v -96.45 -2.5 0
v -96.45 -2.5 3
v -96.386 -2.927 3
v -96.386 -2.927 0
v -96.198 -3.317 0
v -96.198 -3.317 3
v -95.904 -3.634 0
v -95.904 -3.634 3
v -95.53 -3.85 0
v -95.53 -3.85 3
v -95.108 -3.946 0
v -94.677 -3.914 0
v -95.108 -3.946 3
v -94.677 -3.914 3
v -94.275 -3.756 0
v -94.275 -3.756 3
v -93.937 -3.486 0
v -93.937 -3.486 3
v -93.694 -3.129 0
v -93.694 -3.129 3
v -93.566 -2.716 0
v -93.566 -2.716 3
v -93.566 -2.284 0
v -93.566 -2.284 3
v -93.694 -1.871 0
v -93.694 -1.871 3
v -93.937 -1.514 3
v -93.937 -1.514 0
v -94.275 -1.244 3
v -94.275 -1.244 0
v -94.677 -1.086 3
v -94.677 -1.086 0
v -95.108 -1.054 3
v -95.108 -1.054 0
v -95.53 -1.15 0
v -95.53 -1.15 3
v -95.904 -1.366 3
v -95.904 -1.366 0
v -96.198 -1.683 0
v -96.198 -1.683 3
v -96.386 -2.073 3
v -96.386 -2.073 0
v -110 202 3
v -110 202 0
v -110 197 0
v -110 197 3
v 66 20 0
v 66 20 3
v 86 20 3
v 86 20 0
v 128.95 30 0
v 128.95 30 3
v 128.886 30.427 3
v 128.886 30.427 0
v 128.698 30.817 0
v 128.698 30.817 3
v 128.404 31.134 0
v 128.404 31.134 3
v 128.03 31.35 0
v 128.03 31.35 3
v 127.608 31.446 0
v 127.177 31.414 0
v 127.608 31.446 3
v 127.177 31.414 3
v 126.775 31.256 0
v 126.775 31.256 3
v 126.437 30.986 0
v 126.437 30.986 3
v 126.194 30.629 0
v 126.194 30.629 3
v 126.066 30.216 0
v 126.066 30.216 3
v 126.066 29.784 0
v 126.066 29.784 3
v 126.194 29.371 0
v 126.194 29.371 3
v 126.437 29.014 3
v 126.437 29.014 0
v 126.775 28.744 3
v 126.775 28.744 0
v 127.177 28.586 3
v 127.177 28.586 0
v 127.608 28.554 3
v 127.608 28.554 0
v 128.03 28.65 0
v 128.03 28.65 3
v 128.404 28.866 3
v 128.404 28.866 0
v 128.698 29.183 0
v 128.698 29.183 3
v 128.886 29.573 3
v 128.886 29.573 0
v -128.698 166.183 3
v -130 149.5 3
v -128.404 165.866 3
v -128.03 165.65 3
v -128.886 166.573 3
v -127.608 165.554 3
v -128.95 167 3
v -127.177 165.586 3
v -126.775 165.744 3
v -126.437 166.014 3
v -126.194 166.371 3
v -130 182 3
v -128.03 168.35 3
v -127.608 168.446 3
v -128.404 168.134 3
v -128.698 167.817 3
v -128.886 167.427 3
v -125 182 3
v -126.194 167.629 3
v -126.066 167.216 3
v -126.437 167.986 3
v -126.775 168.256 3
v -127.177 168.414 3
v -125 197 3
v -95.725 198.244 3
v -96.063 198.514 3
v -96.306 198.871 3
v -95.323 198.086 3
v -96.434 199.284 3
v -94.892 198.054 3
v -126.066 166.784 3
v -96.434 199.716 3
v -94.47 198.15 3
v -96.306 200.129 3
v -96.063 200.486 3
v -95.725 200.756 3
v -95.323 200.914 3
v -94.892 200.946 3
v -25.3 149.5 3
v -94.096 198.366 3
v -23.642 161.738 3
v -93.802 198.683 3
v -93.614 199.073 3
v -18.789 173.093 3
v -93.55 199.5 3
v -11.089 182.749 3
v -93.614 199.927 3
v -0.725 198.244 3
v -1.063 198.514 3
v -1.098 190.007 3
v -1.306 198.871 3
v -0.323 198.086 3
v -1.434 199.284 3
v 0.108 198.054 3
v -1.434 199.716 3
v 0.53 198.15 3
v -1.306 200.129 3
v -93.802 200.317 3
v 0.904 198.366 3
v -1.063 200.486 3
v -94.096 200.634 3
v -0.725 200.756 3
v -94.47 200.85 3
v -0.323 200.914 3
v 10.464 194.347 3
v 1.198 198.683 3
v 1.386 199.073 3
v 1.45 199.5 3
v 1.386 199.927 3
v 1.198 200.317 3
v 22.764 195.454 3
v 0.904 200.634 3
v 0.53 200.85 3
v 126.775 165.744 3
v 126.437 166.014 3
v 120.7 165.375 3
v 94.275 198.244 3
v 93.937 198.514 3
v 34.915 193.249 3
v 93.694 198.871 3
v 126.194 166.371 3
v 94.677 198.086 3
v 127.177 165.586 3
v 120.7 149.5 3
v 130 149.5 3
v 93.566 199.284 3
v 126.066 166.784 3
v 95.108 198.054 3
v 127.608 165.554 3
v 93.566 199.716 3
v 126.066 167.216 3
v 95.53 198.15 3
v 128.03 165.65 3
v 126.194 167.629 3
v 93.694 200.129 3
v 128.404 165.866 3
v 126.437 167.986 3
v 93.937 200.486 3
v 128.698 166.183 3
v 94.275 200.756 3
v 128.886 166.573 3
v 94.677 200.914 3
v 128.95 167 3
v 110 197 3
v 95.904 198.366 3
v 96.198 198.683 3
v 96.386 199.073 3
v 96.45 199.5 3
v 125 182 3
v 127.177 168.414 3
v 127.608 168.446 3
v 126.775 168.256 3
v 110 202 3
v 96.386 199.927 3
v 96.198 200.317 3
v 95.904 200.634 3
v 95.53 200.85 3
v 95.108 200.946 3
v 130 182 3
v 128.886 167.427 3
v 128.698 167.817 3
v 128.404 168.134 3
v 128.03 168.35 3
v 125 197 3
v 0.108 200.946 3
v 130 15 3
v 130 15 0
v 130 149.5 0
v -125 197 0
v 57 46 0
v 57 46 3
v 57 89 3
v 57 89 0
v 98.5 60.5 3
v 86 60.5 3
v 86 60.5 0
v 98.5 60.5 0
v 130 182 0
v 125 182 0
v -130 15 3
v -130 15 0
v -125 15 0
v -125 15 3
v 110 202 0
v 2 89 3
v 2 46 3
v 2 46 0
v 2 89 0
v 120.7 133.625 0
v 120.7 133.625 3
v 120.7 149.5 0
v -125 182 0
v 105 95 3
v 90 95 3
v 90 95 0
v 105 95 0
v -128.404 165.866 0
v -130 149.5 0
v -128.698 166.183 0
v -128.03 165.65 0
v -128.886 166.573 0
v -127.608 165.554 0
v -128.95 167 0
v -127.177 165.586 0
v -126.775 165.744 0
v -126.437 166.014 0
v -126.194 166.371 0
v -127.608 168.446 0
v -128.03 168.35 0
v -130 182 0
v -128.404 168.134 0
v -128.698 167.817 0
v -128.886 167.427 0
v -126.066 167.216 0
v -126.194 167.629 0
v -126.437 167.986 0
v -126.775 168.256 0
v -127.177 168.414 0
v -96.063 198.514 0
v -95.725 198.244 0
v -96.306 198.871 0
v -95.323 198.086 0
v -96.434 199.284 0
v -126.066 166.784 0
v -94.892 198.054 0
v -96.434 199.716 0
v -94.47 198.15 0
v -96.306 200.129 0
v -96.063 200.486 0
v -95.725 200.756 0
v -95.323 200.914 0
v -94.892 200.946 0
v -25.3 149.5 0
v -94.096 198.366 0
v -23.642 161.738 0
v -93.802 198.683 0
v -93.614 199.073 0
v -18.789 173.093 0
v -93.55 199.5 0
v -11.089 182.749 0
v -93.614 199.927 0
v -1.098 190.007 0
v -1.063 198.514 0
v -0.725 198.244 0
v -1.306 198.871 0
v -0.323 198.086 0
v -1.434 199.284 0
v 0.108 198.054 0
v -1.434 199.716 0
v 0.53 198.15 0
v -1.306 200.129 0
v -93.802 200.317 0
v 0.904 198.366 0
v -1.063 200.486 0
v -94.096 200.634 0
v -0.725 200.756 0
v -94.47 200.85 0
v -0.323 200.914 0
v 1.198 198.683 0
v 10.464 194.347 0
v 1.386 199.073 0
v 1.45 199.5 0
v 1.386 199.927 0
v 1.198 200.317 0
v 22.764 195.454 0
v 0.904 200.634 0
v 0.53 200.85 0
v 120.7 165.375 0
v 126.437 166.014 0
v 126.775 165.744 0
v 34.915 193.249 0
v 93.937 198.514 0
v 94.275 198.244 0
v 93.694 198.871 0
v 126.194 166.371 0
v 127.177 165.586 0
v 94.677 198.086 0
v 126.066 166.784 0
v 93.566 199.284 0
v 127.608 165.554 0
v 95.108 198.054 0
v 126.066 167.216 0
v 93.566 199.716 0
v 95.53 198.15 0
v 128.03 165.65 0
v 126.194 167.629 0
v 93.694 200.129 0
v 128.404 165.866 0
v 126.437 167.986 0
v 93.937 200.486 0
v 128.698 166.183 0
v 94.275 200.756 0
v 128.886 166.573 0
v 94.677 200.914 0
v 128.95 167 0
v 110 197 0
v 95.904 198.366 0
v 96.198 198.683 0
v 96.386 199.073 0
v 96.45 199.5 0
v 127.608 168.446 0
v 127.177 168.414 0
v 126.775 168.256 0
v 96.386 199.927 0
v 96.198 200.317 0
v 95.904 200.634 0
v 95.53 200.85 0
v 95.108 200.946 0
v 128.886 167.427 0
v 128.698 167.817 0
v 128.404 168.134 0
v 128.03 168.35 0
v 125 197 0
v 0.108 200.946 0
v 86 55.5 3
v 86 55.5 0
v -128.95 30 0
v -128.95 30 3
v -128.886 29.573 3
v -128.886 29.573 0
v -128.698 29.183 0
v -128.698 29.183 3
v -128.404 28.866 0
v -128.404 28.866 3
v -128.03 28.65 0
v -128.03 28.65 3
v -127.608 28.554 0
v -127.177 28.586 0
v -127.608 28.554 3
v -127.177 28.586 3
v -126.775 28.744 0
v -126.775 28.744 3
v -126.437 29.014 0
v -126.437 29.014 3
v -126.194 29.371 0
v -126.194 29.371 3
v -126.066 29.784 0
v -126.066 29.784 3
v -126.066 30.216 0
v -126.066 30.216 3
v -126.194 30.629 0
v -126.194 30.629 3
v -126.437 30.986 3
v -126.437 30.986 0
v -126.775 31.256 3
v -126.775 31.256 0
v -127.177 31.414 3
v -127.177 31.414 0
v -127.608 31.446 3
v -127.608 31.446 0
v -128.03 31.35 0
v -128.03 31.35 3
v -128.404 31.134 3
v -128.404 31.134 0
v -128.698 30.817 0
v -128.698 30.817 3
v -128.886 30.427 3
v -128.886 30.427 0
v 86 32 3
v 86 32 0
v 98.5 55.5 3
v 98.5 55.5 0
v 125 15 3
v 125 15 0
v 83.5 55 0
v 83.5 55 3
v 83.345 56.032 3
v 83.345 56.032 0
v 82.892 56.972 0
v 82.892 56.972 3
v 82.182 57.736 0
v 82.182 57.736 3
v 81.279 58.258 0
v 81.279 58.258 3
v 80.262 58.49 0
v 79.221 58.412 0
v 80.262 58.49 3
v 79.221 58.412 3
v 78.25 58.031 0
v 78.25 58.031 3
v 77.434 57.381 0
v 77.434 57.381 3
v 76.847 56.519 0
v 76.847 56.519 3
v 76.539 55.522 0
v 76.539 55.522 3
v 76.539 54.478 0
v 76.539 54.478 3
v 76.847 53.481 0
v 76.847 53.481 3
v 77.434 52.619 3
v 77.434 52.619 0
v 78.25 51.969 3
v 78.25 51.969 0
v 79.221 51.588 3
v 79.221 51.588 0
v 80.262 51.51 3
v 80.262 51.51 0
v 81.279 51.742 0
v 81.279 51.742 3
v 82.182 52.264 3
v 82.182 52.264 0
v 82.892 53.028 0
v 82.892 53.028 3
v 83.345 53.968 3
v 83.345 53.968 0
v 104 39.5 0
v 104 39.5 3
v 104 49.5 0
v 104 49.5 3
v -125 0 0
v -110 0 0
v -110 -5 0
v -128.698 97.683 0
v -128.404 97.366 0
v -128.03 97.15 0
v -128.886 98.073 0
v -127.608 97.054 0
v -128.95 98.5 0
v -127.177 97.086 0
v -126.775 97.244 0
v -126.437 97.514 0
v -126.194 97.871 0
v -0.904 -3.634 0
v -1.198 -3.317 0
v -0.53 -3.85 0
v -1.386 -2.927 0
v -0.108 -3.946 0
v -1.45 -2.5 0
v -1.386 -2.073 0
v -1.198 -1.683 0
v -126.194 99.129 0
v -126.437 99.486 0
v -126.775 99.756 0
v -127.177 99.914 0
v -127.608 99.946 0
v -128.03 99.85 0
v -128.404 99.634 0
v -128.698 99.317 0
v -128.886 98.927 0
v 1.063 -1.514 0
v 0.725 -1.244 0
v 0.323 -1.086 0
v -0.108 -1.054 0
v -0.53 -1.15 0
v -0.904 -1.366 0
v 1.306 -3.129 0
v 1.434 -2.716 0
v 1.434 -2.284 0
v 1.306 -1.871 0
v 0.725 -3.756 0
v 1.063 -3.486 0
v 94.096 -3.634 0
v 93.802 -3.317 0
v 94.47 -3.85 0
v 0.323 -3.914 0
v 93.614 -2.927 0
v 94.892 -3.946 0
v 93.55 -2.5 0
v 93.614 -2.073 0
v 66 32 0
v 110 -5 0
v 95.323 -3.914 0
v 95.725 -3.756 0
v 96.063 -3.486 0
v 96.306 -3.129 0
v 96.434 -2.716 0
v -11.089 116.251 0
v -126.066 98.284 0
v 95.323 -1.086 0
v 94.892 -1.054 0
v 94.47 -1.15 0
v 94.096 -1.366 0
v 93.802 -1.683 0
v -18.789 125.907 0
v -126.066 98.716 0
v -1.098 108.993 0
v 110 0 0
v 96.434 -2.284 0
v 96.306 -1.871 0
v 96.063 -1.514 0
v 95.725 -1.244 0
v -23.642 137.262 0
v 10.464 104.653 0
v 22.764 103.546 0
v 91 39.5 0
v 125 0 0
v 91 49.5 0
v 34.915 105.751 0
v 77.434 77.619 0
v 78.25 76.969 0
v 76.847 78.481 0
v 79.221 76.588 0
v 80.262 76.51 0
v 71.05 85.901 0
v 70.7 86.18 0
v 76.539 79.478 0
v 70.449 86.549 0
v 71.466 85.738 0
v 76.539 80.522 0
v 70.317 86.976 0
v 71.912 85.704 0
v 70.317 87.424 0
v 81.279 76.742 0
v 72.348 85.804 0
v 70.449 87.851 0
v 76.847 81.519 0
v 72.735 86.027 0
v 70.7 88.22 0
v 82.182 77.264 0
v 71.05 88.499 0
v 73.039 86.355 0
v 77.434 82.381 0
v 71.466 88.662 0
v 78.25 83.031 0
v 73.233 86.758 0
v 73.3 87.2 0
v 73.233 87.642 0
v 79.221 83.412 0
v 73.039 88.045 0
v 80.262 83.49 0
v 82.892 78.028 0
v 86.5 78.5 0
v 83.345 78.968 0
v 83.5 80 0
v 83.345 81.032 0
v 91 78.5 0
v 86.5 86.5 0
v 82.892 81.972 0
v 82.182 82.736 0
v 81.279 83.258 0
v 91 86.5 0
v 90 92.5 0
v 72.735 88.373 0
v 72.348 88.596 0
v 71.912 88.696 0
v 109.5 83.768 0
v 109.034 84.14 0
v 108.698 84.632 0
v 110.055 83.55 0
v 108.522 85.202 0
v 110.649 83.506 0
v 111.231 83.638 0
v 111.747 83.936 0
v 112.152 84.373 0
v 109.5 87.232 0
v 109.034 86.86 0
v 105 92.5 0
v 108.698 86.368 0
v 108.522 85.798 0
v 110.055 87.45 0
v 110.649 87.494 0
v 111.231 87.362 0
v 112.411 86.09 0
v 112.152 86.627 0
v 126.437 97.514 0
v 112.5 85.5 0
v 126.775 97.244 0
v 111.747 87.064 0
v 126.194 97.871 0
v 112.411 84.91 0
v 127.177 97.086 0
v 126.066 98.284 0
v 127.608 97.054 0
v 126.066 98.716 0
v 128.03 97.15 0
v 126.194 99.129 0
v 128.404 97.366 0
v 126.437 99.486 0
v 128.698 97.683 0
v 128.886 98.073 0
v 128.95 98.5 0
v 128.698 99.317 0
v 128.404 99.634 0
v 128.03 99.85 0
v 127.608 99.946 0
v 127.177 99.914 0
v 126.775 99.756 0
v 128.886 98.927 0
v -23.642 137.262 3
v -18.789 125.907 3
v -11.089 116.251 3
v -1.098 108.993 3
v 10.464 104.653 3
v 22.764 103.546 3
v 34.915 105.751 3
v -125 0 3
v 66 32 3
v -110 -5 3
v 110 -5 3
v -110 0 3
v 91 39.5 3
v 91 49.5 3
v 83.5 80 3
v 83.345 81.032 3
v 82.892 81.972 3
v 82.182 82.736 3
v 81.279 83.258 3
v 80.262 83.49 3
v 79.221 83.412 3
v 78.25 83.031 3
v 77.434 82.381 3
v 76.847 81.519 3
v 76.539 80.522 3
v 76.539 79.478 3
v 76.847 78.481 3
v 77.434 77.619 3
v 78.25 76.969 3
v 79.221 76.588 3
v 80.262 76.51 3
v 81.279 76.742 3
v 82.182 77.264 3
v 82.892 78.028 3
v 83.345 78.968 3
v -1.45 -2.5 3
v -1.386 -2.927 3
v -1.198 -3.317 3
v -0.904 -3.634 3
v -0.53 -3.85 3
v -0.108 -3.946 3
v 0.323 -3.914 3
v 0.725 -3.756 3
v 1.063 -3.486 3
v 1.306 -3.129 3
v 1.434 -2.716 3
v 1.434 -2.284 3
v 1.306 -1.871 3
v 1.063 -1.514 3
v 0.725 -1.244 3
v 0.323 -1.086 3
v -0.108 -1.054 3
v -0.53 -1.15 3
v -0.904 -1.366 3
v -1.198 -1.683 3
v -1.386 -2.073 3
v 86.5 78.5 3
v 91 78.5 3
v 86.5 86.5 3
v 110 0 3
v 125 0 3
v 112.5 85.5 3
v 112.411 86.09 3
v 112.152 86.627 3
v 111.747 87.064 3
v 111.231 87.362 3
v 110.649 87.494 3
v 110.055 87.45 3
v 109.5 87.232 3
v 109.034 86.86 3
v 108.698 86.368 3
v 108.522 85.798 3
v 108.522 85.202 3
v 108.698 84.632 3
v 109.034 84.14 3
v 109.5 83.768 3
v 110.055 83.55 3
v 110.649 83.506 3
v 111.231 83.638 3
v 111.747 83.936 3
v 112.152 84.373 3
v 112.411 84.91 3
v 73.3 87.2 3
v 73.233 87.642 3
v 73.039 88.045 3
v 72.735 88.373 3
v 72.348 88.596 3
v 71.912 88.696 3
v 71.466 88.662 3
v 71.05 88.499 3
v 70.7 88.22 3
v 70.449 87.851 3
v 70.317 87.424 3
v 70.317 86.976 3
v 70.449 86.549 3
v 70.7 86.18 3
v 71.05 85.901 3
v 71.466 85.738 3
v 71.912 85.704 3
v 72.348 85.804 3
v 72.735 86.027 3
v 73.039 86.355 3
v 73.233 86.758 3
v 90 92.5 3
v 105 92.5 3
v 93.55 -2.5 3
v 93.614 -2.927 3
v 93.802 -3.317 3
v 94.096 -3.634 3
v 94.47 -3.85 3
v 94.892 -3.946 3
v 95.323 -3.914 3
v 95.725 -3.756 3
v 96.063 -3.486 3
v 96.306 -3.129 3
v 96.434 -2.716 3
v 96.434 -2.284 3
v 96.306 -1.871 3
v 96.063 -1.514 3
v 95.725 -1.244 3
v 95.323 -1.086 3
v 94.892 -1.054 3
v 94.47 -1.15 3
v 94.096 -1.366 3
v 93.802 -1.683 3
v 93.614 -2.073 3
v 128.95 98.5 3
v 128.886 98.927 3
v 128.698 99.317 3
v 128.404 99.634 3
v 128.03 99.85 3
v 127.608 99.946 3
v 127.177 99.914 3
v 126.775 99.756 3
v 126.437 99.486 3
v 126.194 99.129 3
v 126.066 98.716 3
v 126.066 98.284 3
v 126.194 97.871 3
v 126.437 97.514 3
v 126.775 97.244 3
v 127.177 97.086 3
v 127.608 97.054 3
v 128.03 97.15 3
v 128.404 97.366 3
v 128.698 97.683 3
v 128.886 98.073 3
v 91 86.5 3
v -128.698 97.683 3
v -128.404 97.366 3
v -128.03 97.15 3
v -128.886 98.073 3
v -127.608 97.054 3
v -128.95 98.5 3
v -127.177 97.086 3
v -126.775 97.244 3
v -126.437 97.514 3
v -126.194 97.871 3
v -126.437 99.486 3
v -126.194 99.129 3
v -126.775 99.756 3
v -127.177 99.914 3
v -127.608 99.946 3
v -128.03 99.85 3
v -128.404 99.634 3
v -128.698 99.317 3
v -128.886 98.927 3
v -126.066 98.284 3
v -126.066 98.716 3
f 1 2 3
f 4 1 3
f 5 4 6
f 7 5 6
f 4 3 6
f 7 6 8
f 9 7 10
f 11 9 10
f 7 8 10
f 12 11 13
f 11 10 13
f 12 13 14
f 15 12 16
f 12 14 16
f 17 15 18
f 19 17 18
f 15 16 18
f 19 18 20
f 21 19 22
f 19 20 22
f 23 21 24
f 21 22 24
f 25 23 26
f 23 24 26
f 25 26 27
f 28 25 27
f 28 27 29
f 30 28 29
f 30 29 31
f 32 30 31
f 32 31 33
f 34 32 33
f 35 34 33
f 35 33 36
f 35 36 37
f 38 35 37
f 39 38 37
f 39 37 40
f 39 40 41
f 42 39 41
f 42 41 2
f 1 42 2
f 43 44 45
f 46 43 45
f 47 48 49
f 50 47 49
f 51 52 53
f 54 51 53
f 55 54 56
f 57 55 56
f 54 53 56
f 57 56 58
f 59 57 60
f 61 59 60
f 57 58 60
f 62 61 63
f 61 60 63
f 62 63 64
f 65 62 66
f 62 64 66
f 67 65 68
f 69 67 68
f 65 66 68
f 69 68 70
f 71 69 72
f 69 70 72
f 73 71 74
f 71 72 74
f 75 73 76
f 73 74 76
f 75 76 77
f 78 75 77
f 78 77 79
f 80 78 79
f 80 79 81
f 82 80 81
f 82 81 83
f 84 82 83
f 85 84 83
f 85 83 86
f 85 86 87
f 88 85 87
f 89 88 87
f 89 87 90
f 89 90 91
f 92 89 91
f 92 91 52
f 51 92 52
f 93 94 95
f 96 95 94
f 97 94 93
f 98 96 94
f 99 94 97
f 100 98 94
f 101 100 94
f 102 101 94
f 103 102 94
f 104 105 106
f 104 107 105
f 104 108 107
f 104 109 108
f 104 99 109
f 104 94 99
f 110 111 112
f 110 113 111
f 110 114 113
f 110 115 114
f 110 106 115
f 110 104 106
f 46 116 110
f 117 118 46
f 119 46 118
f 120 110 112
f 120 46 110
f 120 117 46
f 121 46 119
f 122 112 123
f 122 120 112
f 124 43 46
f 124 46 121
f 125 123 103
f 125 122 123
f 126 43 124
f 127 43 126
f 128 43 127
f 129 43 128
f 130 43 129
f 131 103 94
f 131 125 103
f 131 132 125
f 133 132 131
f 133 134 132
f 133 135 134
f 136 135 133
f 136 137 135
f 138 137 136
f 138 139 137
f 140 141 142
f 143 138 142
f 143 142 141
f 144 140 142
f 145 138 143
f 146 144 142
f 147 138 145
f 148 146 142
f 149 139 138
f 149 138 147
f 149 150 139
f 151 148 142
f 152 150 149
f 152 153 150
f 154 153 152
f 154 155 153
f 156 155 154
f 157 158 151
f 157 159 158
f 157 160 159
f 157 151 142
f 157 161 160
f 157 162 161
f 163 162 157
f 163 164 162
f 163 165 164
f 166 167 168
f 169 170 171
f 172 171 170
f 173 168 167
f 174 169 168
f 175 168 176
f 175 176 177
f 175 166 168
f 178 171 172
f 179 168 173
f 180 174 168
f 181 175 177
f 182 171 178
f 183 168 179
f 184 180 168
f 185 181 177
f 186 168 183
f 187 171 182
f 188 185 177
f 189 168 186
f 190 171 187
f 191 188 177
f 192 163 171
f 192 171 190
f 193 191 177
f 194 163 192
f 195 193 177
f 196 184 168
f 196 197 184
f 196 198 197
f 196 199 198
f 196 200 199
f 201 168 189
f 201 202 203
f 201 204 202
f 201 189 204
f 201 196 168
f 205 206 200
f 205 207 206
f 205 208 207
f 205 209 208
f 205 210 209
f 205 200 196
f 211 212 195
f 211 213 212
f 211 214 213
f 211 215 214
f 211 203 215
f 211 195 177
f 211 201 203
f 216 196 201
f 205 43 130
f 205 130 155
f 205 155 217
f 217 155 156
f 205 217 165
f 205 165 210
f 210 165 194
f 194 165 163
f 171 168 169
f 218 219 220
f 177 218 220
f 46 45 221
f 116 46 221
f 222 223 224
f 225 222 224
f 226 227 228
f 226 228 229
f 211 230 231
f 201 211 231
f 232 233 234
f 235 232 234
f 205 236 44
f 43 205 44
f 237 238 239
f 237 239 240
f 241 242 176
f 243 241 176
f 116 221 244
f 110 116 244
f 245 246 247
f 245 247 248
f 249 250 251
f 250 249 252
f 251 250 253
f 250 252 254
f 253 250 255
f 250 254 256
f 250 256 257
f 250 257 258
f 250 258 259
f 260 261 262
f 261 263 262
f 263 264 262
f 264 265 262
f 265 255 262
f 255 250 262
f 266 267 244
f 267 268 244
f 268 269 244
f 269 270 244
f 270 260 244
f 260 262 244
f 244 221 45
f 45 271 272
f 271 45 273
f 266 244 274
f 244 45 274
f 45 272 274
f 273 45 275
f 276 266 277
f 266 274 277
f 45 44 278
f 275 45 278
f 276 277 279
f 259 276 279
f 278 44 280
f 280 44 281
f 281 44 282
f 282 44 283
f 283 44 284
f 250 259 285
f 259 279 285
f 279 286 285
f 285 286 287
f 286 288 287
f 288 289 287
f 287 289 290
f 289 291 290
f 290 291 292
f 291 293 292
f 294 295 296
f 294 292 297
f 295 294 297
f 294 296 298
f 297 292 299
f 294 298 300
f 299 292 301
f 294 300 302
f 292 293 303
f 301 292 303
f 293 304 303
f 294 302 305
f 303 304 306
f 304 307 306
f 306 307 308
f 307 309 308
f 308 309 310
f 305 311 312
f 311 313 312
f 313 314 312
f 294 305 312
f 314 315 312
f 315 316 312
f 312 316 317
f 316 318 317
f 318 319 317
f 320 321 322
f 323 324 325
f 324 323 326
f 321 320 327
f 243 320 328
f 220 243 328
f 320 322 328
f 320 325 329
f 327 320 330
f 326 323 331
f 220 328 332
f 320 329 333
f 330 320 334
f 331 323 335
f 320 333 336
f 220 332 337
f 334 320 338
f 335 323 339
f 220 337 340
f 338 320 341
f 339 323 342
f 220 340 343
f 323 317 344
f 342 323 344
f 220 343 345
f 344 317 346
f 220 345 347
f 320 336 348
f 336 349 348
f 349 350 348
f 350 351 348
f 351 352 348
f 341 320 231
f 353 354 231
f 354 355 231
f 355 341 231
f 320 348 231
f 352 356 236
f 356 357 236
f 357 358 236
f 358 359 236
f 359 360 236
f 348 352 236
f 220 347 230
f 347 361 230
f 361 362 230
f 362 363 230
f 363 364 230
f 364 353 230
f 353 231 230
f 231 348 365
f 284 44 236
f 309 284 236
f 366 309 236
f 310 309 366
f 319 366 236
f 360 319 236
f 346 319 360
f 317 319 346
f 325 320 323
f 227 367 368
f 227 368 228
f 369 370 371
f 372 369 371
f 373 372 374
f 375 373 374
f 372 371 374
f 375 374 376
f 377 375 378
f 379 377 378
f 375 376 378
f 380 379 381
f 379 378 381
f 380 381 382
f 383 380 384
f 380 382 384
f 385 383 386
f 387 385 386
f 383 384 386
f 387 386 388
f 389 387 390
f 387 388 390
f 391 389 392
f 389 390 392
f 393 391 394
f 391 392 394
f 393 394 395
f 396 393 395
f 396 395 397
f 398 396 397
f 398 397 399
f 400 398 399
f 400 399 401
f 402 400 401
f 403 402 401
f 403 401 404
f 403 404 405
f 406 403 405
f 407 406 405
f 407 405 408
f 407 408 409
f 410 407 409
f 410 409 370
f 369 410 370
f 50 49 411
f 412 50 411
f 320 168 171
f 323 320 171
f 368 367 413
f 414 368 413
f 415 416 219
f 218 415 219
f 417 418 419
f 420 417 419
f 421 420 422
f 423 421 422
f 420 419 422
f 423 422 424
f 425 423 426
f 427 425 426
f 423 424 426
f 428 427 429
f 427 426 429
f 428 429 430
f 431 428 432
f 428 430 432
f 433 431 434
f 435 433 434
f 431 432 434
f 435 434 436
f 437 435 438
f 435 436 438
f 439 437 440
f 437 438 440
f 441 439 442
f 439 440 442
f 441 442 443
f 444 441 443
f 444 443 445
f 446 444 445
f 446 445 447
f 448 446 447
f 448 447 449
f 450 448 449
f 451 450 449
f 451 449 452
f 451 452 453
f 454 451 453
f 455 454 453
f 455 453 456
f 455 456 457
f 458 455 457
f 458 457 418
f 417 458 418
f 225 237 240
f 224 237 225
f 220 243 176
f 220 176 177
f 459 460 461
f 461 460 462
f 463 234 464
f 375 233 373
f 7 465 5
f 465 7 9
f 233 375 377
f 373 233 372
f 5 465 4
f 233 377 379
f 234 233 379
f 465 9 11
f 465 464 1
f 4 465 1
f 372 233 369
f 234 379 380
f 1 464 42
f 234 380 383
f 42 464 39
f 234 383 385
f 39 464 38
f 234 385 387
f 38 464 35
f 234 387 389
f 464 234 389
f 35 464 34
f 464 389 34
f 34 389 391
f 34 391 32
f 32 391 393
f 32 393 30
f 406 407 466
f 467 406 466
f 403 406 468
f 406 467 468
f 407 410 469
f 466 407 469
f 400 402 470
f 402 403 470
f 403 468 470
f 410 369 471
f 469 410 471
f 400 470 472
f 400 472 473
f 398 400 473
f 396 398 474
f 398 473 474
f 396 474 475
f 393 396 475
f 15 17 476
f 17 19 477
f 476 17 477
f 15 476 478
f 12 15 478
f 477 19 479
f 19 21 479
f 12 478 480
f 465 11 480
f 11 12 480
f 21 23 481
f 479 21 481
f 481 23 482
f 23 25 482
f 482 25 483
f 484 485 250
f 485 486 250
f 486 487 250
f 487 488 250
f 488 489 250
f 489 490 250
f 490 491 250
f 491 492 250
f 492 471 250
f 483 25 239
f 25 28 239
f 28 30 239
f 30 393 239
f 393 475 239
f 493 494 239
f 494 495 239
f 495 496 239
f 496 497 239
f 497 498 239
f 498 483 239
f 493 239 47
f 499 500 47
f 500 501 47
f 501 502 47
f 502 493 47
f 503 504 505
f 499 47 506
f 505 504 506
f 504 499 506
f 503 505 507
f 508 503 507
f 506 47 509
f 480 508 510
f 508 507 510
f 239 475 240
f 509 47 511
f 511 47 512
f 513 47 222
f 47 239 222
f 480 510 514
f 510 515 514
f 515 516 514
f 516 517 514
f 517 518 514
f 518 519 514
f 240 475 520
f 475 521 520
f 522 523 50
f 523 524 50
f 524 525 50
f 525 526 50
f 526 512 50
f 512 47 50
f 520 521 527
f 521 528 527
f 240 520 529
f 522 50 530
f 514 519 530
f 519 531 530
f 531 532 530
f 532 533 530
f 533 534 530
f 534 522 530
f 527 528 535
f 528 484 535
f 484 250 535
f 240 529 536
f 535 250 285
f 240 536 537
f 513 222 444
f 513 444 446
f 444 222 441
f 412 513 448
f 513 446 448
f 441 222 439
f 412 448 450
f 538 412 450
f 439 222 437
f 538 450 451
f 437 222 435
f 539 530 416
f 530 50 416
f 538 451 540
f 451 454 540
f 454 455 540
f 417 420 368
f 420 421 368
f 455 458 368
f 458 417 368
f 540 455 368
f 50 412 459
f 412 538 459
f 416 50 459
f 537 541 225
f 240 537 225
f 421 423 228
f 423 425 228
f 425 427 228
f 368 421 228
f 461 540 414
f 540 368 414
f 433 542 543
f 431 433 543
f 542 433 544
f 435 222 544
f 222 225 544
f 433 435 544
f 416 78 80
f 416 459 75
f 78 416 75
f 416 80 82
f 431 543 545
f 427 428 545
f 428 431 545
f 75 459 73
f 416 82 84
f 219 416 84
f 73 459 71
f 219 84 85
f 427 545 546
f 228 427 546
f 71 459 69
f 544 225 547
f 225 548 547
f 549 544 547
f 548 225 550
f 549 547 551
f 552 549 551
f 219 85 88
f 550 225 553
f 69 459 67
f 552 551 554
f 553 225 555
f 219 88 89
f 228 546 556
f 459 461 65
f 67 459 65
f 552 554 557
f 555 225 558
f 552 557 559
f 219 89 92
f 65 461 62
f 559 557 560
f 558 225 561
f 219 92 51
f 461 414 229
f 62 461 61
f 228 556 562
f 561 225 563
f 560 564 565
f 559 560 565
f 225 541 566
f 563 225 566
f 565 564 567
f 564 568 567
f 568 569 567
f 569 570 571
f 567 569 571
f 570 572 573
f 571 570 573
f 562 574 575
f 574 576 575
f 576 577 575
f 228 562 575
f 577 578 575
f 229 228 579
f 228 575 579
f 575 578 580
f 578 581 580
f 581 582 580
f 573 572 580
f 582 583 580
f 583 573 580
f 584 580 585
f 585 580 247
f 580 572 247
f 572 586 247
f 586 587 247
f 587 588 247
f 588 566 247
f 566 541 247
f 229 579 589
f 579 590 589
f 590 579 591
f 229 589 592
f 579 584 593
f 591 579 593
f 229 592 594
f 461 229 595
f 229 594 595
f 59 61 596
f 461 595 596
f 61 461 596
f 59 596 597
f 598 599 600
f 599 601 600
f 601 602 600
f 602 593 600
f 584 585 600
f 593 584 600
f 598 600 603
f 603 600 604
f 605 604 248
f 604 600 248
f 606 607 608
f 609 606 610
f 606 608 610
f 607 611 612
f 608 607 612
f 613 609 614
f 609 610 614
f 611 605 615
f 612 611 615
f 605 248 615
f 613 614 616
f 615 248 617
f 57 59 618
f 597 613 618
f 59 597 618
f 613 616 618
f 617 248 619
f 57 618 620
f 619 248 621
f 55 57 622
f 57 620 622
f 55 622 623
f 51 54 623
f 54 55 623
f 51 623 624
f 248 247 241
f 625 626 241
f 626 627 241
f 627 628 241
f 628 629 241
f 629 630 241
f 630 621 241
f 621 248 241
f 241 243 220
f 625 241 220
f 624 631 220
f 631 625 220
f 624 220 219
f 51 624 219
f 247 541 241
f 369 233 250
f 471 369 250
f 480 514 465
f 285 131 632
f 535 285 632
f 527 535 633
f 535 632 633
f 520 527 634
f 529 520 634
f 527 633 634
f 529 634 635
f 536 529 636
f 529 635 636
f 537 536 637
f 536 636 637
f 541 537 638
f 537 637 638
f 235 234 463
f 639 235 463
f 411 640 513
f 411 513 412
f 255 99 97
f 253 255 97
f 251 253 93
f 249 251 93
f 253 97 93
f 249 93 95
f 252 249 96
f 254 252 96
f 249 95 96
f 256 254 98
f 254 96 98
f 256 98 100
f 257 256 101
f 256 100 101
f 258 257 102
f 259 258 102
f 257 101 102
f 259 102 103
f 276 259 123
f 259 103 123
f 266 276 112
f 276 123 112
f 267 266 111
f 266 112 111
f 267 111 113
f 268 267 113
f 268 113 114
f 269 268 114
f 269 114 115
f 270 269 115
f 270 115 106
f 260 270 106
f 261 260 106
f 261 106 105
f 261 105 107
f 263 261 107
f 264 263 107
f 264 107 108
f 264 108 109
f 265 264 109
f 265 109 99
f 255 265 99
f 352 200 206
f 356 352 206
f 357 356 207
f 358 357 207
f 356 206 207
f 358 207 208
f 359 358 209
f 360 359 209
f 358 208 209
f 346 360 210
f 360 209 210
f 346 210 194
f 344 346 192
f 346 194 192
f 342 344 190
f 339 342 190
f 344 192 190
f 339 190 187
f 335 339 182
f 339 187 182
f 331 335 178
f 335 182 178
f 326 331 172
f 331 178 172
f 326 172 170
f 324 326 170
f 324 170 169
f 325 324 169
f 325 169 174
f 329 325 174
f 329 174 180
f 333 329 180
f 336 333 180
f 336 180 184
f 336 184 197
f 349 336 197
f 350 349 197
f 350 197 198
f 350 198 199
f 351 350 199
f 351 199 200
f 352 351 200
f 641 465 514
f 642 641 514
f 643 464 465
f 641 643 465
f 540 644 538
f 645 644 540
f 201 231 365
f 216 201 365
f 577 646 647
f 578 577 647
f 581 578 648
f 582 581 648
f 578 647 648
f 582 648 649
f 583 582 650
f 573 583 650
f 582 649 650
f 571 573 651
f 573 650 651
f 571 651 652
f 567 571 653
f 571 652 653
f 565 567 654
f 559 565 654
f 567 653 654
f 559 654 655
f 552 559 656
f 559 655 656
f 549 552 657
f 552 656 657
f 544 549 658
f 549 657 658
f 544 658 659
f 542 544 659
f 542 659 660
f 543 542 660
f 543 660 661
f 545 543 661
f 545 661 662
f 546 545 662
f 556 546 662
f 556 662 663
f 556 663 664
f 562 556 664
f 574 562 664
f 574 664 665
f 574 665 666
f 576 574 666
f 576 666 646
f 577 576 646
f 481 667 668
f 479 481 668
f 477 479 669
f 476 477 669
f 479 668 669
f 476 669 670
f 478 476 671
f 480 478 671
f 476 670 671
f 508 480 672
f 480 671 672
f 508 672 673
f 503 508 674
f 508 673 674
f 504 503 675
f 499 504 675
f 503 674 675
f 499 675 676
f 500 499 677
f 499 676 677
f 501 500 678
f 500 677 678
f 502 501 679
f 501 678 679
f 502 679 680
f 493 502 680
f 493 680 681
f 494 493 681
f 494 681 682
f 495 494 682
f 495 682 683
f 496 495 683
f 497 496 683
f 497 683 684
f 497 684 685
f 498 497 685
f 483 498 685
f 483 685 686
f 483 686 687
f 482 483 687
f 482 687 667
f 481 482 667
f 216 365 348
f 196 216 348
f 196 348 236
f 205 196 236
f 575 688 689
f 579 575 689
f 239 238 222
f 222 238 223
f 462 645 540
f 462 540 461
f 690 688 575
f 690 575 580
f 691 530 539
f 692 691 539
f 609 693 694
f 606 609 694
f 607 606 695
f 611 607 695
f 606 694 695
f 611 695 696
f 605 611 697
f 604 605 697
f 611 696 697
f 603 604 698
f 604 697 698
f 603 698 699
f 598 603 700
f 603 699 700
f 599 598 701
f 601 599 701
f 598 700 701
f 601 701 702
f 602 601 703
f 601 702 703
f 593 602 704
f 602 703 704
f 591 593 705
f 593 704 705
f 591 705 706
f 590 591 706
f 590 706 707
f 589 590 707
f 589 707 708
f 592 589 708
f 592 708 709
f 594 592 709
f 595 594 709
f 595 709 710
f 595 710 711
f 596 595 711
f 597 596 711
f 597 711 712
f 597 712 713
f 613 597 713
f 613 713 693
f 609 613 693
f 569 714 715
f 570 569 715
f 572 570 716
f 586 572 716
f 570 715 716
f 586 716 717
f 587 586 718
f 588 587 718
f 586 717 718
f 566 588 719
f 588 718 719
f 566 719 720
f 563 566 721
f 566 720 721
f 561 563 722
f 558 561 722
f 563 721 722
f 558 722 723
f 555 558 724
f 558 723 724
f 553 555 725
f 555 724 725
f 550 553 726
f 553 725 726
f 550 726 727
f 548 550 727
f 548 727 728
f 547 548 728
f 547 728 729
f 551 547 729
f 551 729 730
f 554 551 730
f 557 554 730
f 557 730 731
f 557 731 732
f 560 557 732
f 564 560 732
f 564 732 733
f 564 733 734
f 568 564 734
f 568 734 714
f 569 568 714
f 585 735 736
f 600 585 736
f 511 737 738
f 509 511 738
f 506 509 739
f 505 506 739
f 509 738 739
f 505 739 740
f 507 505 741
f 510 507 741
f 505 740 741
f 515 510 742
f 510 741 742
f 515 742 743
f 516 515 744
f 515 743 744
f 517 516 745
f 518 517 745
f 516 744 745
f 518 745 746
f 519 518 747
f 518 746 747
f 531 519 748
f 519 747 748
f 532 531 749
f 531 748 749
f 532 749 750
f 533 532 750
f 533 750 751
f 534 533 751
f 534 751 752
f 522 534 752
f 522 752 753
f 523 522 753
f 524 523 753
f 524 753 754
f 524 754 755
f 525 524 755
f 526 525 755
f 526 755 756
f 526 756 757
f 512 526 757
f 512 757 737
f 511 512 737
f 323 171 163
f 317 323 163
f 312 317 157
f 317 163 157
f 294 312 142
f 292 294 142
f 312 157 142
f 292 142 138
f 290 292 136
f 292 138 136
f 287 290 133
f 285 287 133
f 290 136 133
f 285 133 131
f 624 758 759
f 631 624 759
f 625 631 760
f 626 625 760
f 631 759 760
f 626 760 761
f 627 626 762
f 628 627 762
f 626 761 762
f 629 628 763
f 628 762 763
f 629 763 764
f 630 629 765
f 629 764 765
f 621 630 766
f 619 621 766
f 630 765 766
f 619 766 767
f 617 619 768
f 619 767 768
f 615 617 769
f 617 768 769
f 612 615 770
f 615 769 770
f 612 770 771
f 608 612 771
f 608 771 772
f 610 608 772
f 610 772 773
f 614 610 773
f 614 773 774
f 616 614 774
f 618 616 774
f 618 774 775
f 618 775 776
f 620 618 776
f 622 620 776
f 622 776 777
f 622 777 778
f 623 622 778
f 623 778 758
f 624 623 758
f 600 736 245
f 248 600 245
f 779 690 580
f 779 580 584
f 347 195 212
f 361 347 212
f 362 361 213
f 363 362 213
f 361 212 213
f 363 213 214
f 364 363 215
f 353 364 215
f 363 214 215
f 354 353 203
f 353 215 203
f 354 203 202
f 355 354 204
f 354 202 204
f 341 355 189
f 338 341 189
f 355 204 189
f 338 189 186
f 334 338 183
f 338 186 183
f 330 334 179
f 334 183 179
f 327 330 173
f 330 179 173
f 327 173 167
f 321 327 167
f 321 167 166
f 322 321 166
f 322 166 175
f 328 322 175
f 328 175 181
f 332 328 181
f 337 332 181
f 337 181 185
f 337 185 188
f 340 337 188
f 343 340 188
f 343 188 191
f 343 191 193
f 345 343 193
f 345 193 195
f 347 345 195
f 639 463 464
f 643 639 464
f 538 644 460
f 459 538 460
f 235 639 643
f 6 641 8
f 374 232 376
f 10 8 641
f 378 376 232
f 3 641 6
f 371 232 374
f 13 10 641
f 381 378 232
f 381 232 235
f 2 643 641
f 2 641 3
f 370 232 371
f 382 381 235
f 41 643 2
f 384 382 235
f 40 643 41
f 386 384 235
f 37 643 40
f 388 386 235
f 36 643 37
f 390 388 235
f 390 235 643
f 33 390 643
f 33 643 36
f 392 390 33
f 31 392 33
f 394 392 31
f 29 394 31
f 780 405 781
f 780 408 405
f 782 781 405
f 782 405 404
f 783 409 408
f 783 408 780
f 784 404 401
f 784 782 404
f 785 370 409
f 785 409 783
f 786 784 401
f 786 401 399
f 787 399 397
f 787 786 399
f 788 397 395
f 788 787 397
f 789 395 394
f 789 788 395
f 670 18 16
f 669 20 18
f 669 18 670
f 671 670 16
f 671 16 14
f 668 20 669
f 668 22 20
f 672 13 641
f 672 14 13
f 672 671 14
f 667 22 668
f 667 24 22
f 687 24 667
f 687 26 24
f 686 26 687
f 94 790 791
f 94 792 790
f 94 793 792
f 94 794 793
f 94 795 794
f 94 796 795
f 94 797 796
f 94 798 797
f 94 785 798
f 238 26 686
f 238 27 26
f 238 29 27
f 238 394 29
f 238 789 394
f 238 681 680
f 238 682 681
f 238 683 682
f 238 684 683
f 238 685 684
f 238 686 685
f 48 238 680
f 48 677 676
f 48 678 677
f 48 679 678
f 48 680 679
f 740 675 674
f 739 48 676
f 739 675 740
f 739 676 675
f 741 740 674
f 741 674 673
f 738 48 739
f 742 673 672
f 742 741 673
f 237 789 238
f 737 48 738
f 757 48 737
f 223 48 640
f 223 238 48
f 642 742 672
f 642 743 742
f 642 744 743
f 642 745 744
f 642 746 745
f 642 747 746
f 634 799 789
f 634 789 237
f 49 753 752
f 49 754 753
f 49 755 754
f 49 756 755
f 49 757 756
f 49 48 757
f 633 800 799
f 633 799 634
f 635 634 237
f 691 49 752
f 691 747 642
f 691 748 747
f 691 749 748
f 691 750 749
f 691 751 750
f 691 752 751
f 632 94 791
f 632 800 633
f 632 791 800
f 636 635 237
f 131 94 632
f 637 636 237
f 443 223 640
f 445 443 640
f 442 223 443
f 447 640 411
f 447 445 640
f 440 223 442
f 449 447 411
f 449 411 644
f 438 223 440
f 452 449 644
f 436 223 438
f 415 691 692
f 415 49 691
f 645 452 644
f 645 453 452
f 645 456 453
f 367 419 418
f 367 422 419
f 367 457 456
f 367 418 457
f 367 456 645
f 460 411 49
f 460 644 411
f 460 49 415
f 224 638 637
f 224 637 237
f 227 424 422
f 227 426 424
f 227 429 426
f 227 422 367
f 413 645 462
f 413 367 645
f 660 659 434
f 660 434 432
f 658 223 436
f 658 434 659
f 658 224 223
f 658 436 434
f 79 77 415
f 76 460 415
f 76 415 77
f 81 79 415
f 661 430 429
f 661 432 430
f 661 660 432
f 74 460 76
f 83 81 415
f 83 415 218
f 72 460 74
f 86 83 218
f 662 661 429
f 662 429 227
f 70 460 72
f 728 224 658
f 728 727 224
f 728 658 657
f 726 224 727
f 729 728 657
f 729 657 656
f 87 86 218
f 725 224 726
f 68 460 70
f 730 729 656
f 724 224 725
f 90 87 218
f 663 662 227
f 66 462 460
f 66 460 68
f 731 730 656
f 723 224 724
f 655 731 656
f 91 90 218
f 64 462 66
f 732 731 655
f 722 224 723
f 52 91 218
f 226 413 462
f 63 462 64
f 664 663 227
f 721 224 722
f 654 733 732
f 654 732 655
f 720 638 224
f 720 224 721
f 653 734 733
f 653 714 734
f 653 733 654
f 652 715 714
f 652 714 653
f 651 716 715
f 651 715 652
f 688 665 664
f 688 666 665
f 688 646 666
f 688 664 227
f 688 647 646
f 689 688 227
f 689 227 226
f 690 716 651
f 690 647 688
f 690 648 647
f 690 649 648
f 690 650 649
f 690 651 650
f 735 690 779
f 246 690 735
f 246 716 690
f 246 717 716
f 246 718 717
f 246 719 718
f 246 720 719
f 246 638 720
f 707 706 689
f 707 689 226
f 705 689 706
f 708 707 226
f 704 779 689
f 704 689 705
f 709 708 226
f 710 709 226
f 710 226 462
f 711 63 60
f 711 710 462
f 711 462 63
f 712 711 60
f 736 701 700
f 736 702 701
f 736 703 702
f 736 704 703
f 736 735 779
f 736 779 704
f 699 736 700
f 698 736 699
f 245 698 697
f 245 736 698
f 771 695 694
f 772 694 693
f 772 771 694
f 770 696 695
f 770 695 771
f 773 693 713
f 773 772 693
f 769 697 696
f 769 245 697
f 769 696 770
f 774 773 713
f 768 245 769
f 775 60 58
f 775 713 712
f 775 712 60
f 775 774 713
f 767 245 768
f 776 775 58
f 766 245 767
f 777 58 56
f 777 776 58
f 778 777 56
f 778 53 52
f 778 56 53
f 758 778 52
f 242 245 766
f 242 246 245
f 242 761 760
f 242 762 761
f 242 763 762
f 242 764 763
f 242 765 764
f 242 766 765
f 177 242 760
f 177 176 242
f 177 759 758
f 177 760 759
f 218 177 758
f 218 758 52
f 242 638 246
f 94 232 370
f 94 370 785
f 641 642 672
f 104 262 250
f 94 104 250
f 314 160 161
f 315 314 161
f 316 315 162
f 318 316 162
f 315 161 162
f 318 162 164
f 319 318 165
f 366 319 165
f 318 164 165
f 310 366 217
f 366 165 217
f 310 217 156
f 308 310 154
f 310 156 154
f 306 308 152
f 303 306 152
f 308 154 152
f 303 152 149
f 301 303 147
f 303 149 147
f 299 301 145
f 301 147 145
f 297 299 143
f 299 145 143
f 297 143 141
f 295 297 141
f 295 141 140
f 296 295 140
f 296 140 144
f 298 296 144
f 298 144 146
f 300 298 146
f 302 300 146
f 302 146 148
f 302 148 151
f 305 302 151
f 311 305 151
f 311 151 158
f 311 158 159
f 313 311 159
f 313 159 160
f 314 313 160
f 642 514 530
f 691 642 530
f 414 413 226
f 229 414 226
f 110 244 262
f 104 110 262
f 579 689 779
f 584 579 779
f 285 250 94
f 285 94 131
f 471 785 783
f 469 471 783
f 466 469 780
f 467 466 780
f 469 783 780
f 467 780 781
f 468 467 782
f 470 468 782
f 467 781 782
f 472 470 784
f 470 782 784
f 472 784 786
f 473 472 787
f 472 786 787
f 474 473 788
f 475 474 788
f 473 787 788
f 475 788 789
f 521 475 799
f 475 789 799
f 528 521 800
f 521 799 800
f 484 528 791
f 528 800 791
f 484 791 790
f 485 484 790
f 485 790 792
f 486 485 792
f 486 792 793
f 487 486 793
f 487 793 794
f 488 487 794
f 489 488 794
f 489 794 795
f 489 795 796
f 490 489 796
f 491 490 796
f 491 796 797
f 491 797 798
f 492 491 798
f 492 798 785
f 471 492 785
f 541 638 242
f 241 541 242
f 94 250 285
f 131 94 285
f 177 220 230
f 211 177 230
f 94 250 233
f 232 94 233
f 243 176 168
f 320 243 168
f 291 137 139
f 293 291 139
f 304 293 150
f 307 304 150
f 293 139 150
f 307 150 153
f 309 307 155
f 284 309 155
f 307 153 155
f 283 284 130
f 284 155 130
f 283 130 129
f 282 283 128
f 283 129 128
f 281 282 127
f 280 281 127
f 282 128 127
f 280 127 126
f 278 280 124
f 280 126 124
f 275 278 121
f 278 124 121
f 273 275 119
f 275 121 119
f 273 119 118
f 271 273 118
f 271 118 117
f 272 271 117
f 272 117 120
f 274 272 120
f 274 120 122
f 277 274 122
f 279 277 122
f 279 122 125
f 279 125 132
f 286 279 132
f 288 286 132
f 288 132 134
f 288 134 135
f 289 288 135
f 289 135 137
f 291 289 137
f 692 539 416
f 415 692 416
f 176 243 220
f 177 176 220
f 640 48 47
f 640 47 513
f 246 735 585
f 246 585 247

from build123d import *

# Parameters (mm, degrees)
BOSS_EXTRUDE1_DEPTH    = 3
CUT_EXTRUDE1_DEPTH     = 241.235301319
SKETCH3_W              = 55
SKETCH3_H              = 43
CUT_EXTRUDE2_DEPTH     = 241.235301319
SPLIT1_SURFACE_1_BACK  = 333.352
SPLIT1_SURFACE_1_DEPTH = 666.704
SPLIT1_SURFACE_2_BACK  = 333.352
SPLIT1_SURFACE_2_DEPTH = 666.704
SKETCH5_W              = 20
SKETCH5_H              = 12
CUT_EXTRUDE3_DEPTH     = 241.235301319
SKETCH6_R              = 3.5
CUT_EXTRUDE4_DEPTH     = 241.235301319
SKETCH7_R              = 1.45
CUT_EXTRUDE5_DEPTH     = 241.235301319
SKETCH8_R              = 2
SKETCH8_R_2            = 1.5
SKETCH8_W              = 12.5
SKETCH8_H              = 5
SKETCH8_W_2            = 4.5
SKETCH8_H_2            = 8
SKETCH8_W_3            = 15
SKETCH8_H_3            = 2.5
SKETCH8_W_4            = 13
SKETCH8_H_4            = 10
CUT_EXTRUDE6_DEPTH     = 241.235301319


with BuildPart() as part:
    # Sketch1 → Boss-Extrude1 (new body)
    with BuildSketch(Plane.XY):
        Polygon((110, 202), (-110, 202), (-110, 197), (-125, 197), (-125, 182), (-130, 182), (-130, 15), (-125, 15), (-125, 0), (-110, 0), (-110, -5), (110, -5), (110, 0), (125, 0), (125, 15), (130, 15), (130, 182), (125, 182), (125, 197), (110, 197), align=None)
    extrude(amount=BOSS_EXTRUDE1_DEPTH)

    # Sketch2 → Cut-Extrude1 (cut, through all)
    with BuildSketch(Plane.XY.offset(3)):
        with BuildLine():
            Line((34.914781741, 105.75140025), (120.7, 133.624707308))
            Line((120.7, 133.624707308), (120.7, 165.375292692))
            Line((120.7, 165.375292692), (34.914781741, 193.24859975))
            ThreePointArc((34.914781741, 193.24859975), (-25.3, 149.5), (34.914781741, 105.75140025))
        make_face()
    extrude(amount=-CUT_EXTRUDE1_DEPTH, mode=Mode.SUBTRACT)

    # Sketch3 → Cut-Extrude2 (cut, through all)
    with BuildSketch(Plane.XY.offset(3)):
        with Locations((29.5, 67.5)):
            Rectangle(SKETCH3_W, SKETCH3_H)
    extrude(amount=-CUT_EXTRUDE2_DEPTH, mode=Mode.SUBTRACT)


with BuildPart() as body_2:
    # Split1: the piece behind the surface
    add(part.part)
    # Split1 surface: a surface, the sketch's curves swept straight by 666.704 mm
    with BuildLine(Plane.XY.offset(3).offset(-SPLIT1_SURFACE_1_BACK), mode=Mode.PRIVATE) as split1_surface_1_path:
        Line((-130, 149.5), (130, 149.5))
    split1_surface_1 = Shell.extrude(split1_surface_1_path.wire(), (0 * SPLIT1_SURFACE_1_DEPTH, 0 * SPLIT1_SURFACE_1_DEPTH, 1 * SPLIT1_SURFACE_1_DEPTH))
    split(bisect_by=split1_surface_1, keep=Keep.BOTTOM)

    # Sketch5 → Cut-Extrude3 (cut, through all)
    with BuildSketch(Plane.XY.offset(3)):
        with Locations((76, 26)):
            Rectangle(SKETCH5_W, SKETCH5_H)
    extrude(amount=-CUT_EXTRUDE3_DEPTH, mode=Mode.SUBTRACT)

    # Sketch6 → Cut-Extrude4 (cut, through all)
    with BuildSketch(Plane.XY.offset(3)):
        with Locations((80, 55)):
            Circle(SKETCH6_R)
        with Locations((80, 80)):
            Circle(SKETCH6_R)
    extrude(amount=-CUT_EXTRUDE4_DEPTH, mode=Mode.SUBTRACT)


with BuildPart() as part_1:
    add(part.part)

    # Split1: split by a surface, the side it looks to stays
    # Split1 surface: a surface, the sketch's curves swept straight by 666.704 mm
    with BuildLine(Plane.XY.offset(3).offset(-SPLIT1_SURFACE_2_BACK), mode=Mode.PRIVATE) as split1_surface_2_path:
        Line((-130, 149.5), (130, 149.5))
    split1_surface_2 = Shell.extrude(split1_surface_2_path.wire(), (0 * SPLIT1_SURFACE_2_DEPTH, 0 * SPLIT1_SURFACE_2_DEPTH, 1 * SPLIT1_SURFACE_2_DEPTH))
    split(bisect_by=split1_surface_2, keep=Keep.TOP)


with BuildPart() as cut_extrude5_tool:
    # Sketch7 → Cut-Extrude5 (new, through all)
    with BuildSketch(Plane.XY.offset(3)):
        with Locations((-95, 199.5)):
            Circle(SKETCH7_R)
        with Locations((95, 199.5)):
            Circle(SKETCH7_R)
        with Locations((0, 199.5)):
            Circle(SKETCH7_R)
        with Locations((127.5, 167)):
            Circle(SKETCH7_R)
        with Locations((127.5, 98.5)):
            Circle(SKETCH7_R)
        with Locations((127.5, 30)):
            Circle(SKETCH7_R)
        with Locations(Location((95, -2.5, 0), (0, 0, 180))):
            Circle(SKETCH7_R)
        with Locations(Location((0, -2.5, 0), (0, 0, 180))):
            Circle(SKETCH7_R)
        with Locations(Location((-95, -2.5, 0), (0, 0, 180))):
            Circle(SKETCH7_R)
        with Locations(Location((-127.5, 30, 0), (0, 0, 180))):
            Circle(SKETCH7_R)
        with Locations(Location((-127.5, 98.5, 0), (0, 0, 180))):
            Circle(SKETCH7_R)
        with Locations(Location((-127.5, 167, 0), (0, 0, 180))):
            Circle(SKETCH7_R)
    extrude(amount=-CUT_EXTRUDE5_DEPTH)


with BuildPart() as part_2:
    add(part_1.part)

    # Cut-Extrude5: cut by cut_extrude5_tool
    add(cut_extrude5_tool.part, mode=Mode.SUBTRACT)


with BuildPart() as body_2_1:
    add(body_2.part)

    # Cut-Extrude5: cut by cut_extrude5_tool
    add(cut_extrude5_tool.part, mode=Mode.SUBTRACT)

    # Sketch8 → Cut-Extrude6 (cut, through all)
    with BuildSketch(Plane.XY.offset(3)):
        with Locations((110.5, 85.5)):
            Circle(SKETCH8_R)
        with Locations((71.8, 87.2)):
            Circle(SKETCH8_R_2)
        with Locations((92.25, 58)):
            Rectangle(SKETCH8_W, SKETCH8_H)
        with Locations((88.75, 82.5)):
            Rectangle(SKETCH8_W_2, SKETCH8_H_2)
        with Locations((97.5, 93.75)):
            Rectangle(SKETCH8_W_3, SKETCH8_H_3)
        with Locations((97.5, 44.5)):
            Rectangle(SKETCH8_W_4, SKETCH8_H_4)
    extrude(amount=-CUT_EXTRUDE6_DEPTH, mode=Mode.SUBTRACT)


solid = Compound([part_2.part, body_2_1.part])
